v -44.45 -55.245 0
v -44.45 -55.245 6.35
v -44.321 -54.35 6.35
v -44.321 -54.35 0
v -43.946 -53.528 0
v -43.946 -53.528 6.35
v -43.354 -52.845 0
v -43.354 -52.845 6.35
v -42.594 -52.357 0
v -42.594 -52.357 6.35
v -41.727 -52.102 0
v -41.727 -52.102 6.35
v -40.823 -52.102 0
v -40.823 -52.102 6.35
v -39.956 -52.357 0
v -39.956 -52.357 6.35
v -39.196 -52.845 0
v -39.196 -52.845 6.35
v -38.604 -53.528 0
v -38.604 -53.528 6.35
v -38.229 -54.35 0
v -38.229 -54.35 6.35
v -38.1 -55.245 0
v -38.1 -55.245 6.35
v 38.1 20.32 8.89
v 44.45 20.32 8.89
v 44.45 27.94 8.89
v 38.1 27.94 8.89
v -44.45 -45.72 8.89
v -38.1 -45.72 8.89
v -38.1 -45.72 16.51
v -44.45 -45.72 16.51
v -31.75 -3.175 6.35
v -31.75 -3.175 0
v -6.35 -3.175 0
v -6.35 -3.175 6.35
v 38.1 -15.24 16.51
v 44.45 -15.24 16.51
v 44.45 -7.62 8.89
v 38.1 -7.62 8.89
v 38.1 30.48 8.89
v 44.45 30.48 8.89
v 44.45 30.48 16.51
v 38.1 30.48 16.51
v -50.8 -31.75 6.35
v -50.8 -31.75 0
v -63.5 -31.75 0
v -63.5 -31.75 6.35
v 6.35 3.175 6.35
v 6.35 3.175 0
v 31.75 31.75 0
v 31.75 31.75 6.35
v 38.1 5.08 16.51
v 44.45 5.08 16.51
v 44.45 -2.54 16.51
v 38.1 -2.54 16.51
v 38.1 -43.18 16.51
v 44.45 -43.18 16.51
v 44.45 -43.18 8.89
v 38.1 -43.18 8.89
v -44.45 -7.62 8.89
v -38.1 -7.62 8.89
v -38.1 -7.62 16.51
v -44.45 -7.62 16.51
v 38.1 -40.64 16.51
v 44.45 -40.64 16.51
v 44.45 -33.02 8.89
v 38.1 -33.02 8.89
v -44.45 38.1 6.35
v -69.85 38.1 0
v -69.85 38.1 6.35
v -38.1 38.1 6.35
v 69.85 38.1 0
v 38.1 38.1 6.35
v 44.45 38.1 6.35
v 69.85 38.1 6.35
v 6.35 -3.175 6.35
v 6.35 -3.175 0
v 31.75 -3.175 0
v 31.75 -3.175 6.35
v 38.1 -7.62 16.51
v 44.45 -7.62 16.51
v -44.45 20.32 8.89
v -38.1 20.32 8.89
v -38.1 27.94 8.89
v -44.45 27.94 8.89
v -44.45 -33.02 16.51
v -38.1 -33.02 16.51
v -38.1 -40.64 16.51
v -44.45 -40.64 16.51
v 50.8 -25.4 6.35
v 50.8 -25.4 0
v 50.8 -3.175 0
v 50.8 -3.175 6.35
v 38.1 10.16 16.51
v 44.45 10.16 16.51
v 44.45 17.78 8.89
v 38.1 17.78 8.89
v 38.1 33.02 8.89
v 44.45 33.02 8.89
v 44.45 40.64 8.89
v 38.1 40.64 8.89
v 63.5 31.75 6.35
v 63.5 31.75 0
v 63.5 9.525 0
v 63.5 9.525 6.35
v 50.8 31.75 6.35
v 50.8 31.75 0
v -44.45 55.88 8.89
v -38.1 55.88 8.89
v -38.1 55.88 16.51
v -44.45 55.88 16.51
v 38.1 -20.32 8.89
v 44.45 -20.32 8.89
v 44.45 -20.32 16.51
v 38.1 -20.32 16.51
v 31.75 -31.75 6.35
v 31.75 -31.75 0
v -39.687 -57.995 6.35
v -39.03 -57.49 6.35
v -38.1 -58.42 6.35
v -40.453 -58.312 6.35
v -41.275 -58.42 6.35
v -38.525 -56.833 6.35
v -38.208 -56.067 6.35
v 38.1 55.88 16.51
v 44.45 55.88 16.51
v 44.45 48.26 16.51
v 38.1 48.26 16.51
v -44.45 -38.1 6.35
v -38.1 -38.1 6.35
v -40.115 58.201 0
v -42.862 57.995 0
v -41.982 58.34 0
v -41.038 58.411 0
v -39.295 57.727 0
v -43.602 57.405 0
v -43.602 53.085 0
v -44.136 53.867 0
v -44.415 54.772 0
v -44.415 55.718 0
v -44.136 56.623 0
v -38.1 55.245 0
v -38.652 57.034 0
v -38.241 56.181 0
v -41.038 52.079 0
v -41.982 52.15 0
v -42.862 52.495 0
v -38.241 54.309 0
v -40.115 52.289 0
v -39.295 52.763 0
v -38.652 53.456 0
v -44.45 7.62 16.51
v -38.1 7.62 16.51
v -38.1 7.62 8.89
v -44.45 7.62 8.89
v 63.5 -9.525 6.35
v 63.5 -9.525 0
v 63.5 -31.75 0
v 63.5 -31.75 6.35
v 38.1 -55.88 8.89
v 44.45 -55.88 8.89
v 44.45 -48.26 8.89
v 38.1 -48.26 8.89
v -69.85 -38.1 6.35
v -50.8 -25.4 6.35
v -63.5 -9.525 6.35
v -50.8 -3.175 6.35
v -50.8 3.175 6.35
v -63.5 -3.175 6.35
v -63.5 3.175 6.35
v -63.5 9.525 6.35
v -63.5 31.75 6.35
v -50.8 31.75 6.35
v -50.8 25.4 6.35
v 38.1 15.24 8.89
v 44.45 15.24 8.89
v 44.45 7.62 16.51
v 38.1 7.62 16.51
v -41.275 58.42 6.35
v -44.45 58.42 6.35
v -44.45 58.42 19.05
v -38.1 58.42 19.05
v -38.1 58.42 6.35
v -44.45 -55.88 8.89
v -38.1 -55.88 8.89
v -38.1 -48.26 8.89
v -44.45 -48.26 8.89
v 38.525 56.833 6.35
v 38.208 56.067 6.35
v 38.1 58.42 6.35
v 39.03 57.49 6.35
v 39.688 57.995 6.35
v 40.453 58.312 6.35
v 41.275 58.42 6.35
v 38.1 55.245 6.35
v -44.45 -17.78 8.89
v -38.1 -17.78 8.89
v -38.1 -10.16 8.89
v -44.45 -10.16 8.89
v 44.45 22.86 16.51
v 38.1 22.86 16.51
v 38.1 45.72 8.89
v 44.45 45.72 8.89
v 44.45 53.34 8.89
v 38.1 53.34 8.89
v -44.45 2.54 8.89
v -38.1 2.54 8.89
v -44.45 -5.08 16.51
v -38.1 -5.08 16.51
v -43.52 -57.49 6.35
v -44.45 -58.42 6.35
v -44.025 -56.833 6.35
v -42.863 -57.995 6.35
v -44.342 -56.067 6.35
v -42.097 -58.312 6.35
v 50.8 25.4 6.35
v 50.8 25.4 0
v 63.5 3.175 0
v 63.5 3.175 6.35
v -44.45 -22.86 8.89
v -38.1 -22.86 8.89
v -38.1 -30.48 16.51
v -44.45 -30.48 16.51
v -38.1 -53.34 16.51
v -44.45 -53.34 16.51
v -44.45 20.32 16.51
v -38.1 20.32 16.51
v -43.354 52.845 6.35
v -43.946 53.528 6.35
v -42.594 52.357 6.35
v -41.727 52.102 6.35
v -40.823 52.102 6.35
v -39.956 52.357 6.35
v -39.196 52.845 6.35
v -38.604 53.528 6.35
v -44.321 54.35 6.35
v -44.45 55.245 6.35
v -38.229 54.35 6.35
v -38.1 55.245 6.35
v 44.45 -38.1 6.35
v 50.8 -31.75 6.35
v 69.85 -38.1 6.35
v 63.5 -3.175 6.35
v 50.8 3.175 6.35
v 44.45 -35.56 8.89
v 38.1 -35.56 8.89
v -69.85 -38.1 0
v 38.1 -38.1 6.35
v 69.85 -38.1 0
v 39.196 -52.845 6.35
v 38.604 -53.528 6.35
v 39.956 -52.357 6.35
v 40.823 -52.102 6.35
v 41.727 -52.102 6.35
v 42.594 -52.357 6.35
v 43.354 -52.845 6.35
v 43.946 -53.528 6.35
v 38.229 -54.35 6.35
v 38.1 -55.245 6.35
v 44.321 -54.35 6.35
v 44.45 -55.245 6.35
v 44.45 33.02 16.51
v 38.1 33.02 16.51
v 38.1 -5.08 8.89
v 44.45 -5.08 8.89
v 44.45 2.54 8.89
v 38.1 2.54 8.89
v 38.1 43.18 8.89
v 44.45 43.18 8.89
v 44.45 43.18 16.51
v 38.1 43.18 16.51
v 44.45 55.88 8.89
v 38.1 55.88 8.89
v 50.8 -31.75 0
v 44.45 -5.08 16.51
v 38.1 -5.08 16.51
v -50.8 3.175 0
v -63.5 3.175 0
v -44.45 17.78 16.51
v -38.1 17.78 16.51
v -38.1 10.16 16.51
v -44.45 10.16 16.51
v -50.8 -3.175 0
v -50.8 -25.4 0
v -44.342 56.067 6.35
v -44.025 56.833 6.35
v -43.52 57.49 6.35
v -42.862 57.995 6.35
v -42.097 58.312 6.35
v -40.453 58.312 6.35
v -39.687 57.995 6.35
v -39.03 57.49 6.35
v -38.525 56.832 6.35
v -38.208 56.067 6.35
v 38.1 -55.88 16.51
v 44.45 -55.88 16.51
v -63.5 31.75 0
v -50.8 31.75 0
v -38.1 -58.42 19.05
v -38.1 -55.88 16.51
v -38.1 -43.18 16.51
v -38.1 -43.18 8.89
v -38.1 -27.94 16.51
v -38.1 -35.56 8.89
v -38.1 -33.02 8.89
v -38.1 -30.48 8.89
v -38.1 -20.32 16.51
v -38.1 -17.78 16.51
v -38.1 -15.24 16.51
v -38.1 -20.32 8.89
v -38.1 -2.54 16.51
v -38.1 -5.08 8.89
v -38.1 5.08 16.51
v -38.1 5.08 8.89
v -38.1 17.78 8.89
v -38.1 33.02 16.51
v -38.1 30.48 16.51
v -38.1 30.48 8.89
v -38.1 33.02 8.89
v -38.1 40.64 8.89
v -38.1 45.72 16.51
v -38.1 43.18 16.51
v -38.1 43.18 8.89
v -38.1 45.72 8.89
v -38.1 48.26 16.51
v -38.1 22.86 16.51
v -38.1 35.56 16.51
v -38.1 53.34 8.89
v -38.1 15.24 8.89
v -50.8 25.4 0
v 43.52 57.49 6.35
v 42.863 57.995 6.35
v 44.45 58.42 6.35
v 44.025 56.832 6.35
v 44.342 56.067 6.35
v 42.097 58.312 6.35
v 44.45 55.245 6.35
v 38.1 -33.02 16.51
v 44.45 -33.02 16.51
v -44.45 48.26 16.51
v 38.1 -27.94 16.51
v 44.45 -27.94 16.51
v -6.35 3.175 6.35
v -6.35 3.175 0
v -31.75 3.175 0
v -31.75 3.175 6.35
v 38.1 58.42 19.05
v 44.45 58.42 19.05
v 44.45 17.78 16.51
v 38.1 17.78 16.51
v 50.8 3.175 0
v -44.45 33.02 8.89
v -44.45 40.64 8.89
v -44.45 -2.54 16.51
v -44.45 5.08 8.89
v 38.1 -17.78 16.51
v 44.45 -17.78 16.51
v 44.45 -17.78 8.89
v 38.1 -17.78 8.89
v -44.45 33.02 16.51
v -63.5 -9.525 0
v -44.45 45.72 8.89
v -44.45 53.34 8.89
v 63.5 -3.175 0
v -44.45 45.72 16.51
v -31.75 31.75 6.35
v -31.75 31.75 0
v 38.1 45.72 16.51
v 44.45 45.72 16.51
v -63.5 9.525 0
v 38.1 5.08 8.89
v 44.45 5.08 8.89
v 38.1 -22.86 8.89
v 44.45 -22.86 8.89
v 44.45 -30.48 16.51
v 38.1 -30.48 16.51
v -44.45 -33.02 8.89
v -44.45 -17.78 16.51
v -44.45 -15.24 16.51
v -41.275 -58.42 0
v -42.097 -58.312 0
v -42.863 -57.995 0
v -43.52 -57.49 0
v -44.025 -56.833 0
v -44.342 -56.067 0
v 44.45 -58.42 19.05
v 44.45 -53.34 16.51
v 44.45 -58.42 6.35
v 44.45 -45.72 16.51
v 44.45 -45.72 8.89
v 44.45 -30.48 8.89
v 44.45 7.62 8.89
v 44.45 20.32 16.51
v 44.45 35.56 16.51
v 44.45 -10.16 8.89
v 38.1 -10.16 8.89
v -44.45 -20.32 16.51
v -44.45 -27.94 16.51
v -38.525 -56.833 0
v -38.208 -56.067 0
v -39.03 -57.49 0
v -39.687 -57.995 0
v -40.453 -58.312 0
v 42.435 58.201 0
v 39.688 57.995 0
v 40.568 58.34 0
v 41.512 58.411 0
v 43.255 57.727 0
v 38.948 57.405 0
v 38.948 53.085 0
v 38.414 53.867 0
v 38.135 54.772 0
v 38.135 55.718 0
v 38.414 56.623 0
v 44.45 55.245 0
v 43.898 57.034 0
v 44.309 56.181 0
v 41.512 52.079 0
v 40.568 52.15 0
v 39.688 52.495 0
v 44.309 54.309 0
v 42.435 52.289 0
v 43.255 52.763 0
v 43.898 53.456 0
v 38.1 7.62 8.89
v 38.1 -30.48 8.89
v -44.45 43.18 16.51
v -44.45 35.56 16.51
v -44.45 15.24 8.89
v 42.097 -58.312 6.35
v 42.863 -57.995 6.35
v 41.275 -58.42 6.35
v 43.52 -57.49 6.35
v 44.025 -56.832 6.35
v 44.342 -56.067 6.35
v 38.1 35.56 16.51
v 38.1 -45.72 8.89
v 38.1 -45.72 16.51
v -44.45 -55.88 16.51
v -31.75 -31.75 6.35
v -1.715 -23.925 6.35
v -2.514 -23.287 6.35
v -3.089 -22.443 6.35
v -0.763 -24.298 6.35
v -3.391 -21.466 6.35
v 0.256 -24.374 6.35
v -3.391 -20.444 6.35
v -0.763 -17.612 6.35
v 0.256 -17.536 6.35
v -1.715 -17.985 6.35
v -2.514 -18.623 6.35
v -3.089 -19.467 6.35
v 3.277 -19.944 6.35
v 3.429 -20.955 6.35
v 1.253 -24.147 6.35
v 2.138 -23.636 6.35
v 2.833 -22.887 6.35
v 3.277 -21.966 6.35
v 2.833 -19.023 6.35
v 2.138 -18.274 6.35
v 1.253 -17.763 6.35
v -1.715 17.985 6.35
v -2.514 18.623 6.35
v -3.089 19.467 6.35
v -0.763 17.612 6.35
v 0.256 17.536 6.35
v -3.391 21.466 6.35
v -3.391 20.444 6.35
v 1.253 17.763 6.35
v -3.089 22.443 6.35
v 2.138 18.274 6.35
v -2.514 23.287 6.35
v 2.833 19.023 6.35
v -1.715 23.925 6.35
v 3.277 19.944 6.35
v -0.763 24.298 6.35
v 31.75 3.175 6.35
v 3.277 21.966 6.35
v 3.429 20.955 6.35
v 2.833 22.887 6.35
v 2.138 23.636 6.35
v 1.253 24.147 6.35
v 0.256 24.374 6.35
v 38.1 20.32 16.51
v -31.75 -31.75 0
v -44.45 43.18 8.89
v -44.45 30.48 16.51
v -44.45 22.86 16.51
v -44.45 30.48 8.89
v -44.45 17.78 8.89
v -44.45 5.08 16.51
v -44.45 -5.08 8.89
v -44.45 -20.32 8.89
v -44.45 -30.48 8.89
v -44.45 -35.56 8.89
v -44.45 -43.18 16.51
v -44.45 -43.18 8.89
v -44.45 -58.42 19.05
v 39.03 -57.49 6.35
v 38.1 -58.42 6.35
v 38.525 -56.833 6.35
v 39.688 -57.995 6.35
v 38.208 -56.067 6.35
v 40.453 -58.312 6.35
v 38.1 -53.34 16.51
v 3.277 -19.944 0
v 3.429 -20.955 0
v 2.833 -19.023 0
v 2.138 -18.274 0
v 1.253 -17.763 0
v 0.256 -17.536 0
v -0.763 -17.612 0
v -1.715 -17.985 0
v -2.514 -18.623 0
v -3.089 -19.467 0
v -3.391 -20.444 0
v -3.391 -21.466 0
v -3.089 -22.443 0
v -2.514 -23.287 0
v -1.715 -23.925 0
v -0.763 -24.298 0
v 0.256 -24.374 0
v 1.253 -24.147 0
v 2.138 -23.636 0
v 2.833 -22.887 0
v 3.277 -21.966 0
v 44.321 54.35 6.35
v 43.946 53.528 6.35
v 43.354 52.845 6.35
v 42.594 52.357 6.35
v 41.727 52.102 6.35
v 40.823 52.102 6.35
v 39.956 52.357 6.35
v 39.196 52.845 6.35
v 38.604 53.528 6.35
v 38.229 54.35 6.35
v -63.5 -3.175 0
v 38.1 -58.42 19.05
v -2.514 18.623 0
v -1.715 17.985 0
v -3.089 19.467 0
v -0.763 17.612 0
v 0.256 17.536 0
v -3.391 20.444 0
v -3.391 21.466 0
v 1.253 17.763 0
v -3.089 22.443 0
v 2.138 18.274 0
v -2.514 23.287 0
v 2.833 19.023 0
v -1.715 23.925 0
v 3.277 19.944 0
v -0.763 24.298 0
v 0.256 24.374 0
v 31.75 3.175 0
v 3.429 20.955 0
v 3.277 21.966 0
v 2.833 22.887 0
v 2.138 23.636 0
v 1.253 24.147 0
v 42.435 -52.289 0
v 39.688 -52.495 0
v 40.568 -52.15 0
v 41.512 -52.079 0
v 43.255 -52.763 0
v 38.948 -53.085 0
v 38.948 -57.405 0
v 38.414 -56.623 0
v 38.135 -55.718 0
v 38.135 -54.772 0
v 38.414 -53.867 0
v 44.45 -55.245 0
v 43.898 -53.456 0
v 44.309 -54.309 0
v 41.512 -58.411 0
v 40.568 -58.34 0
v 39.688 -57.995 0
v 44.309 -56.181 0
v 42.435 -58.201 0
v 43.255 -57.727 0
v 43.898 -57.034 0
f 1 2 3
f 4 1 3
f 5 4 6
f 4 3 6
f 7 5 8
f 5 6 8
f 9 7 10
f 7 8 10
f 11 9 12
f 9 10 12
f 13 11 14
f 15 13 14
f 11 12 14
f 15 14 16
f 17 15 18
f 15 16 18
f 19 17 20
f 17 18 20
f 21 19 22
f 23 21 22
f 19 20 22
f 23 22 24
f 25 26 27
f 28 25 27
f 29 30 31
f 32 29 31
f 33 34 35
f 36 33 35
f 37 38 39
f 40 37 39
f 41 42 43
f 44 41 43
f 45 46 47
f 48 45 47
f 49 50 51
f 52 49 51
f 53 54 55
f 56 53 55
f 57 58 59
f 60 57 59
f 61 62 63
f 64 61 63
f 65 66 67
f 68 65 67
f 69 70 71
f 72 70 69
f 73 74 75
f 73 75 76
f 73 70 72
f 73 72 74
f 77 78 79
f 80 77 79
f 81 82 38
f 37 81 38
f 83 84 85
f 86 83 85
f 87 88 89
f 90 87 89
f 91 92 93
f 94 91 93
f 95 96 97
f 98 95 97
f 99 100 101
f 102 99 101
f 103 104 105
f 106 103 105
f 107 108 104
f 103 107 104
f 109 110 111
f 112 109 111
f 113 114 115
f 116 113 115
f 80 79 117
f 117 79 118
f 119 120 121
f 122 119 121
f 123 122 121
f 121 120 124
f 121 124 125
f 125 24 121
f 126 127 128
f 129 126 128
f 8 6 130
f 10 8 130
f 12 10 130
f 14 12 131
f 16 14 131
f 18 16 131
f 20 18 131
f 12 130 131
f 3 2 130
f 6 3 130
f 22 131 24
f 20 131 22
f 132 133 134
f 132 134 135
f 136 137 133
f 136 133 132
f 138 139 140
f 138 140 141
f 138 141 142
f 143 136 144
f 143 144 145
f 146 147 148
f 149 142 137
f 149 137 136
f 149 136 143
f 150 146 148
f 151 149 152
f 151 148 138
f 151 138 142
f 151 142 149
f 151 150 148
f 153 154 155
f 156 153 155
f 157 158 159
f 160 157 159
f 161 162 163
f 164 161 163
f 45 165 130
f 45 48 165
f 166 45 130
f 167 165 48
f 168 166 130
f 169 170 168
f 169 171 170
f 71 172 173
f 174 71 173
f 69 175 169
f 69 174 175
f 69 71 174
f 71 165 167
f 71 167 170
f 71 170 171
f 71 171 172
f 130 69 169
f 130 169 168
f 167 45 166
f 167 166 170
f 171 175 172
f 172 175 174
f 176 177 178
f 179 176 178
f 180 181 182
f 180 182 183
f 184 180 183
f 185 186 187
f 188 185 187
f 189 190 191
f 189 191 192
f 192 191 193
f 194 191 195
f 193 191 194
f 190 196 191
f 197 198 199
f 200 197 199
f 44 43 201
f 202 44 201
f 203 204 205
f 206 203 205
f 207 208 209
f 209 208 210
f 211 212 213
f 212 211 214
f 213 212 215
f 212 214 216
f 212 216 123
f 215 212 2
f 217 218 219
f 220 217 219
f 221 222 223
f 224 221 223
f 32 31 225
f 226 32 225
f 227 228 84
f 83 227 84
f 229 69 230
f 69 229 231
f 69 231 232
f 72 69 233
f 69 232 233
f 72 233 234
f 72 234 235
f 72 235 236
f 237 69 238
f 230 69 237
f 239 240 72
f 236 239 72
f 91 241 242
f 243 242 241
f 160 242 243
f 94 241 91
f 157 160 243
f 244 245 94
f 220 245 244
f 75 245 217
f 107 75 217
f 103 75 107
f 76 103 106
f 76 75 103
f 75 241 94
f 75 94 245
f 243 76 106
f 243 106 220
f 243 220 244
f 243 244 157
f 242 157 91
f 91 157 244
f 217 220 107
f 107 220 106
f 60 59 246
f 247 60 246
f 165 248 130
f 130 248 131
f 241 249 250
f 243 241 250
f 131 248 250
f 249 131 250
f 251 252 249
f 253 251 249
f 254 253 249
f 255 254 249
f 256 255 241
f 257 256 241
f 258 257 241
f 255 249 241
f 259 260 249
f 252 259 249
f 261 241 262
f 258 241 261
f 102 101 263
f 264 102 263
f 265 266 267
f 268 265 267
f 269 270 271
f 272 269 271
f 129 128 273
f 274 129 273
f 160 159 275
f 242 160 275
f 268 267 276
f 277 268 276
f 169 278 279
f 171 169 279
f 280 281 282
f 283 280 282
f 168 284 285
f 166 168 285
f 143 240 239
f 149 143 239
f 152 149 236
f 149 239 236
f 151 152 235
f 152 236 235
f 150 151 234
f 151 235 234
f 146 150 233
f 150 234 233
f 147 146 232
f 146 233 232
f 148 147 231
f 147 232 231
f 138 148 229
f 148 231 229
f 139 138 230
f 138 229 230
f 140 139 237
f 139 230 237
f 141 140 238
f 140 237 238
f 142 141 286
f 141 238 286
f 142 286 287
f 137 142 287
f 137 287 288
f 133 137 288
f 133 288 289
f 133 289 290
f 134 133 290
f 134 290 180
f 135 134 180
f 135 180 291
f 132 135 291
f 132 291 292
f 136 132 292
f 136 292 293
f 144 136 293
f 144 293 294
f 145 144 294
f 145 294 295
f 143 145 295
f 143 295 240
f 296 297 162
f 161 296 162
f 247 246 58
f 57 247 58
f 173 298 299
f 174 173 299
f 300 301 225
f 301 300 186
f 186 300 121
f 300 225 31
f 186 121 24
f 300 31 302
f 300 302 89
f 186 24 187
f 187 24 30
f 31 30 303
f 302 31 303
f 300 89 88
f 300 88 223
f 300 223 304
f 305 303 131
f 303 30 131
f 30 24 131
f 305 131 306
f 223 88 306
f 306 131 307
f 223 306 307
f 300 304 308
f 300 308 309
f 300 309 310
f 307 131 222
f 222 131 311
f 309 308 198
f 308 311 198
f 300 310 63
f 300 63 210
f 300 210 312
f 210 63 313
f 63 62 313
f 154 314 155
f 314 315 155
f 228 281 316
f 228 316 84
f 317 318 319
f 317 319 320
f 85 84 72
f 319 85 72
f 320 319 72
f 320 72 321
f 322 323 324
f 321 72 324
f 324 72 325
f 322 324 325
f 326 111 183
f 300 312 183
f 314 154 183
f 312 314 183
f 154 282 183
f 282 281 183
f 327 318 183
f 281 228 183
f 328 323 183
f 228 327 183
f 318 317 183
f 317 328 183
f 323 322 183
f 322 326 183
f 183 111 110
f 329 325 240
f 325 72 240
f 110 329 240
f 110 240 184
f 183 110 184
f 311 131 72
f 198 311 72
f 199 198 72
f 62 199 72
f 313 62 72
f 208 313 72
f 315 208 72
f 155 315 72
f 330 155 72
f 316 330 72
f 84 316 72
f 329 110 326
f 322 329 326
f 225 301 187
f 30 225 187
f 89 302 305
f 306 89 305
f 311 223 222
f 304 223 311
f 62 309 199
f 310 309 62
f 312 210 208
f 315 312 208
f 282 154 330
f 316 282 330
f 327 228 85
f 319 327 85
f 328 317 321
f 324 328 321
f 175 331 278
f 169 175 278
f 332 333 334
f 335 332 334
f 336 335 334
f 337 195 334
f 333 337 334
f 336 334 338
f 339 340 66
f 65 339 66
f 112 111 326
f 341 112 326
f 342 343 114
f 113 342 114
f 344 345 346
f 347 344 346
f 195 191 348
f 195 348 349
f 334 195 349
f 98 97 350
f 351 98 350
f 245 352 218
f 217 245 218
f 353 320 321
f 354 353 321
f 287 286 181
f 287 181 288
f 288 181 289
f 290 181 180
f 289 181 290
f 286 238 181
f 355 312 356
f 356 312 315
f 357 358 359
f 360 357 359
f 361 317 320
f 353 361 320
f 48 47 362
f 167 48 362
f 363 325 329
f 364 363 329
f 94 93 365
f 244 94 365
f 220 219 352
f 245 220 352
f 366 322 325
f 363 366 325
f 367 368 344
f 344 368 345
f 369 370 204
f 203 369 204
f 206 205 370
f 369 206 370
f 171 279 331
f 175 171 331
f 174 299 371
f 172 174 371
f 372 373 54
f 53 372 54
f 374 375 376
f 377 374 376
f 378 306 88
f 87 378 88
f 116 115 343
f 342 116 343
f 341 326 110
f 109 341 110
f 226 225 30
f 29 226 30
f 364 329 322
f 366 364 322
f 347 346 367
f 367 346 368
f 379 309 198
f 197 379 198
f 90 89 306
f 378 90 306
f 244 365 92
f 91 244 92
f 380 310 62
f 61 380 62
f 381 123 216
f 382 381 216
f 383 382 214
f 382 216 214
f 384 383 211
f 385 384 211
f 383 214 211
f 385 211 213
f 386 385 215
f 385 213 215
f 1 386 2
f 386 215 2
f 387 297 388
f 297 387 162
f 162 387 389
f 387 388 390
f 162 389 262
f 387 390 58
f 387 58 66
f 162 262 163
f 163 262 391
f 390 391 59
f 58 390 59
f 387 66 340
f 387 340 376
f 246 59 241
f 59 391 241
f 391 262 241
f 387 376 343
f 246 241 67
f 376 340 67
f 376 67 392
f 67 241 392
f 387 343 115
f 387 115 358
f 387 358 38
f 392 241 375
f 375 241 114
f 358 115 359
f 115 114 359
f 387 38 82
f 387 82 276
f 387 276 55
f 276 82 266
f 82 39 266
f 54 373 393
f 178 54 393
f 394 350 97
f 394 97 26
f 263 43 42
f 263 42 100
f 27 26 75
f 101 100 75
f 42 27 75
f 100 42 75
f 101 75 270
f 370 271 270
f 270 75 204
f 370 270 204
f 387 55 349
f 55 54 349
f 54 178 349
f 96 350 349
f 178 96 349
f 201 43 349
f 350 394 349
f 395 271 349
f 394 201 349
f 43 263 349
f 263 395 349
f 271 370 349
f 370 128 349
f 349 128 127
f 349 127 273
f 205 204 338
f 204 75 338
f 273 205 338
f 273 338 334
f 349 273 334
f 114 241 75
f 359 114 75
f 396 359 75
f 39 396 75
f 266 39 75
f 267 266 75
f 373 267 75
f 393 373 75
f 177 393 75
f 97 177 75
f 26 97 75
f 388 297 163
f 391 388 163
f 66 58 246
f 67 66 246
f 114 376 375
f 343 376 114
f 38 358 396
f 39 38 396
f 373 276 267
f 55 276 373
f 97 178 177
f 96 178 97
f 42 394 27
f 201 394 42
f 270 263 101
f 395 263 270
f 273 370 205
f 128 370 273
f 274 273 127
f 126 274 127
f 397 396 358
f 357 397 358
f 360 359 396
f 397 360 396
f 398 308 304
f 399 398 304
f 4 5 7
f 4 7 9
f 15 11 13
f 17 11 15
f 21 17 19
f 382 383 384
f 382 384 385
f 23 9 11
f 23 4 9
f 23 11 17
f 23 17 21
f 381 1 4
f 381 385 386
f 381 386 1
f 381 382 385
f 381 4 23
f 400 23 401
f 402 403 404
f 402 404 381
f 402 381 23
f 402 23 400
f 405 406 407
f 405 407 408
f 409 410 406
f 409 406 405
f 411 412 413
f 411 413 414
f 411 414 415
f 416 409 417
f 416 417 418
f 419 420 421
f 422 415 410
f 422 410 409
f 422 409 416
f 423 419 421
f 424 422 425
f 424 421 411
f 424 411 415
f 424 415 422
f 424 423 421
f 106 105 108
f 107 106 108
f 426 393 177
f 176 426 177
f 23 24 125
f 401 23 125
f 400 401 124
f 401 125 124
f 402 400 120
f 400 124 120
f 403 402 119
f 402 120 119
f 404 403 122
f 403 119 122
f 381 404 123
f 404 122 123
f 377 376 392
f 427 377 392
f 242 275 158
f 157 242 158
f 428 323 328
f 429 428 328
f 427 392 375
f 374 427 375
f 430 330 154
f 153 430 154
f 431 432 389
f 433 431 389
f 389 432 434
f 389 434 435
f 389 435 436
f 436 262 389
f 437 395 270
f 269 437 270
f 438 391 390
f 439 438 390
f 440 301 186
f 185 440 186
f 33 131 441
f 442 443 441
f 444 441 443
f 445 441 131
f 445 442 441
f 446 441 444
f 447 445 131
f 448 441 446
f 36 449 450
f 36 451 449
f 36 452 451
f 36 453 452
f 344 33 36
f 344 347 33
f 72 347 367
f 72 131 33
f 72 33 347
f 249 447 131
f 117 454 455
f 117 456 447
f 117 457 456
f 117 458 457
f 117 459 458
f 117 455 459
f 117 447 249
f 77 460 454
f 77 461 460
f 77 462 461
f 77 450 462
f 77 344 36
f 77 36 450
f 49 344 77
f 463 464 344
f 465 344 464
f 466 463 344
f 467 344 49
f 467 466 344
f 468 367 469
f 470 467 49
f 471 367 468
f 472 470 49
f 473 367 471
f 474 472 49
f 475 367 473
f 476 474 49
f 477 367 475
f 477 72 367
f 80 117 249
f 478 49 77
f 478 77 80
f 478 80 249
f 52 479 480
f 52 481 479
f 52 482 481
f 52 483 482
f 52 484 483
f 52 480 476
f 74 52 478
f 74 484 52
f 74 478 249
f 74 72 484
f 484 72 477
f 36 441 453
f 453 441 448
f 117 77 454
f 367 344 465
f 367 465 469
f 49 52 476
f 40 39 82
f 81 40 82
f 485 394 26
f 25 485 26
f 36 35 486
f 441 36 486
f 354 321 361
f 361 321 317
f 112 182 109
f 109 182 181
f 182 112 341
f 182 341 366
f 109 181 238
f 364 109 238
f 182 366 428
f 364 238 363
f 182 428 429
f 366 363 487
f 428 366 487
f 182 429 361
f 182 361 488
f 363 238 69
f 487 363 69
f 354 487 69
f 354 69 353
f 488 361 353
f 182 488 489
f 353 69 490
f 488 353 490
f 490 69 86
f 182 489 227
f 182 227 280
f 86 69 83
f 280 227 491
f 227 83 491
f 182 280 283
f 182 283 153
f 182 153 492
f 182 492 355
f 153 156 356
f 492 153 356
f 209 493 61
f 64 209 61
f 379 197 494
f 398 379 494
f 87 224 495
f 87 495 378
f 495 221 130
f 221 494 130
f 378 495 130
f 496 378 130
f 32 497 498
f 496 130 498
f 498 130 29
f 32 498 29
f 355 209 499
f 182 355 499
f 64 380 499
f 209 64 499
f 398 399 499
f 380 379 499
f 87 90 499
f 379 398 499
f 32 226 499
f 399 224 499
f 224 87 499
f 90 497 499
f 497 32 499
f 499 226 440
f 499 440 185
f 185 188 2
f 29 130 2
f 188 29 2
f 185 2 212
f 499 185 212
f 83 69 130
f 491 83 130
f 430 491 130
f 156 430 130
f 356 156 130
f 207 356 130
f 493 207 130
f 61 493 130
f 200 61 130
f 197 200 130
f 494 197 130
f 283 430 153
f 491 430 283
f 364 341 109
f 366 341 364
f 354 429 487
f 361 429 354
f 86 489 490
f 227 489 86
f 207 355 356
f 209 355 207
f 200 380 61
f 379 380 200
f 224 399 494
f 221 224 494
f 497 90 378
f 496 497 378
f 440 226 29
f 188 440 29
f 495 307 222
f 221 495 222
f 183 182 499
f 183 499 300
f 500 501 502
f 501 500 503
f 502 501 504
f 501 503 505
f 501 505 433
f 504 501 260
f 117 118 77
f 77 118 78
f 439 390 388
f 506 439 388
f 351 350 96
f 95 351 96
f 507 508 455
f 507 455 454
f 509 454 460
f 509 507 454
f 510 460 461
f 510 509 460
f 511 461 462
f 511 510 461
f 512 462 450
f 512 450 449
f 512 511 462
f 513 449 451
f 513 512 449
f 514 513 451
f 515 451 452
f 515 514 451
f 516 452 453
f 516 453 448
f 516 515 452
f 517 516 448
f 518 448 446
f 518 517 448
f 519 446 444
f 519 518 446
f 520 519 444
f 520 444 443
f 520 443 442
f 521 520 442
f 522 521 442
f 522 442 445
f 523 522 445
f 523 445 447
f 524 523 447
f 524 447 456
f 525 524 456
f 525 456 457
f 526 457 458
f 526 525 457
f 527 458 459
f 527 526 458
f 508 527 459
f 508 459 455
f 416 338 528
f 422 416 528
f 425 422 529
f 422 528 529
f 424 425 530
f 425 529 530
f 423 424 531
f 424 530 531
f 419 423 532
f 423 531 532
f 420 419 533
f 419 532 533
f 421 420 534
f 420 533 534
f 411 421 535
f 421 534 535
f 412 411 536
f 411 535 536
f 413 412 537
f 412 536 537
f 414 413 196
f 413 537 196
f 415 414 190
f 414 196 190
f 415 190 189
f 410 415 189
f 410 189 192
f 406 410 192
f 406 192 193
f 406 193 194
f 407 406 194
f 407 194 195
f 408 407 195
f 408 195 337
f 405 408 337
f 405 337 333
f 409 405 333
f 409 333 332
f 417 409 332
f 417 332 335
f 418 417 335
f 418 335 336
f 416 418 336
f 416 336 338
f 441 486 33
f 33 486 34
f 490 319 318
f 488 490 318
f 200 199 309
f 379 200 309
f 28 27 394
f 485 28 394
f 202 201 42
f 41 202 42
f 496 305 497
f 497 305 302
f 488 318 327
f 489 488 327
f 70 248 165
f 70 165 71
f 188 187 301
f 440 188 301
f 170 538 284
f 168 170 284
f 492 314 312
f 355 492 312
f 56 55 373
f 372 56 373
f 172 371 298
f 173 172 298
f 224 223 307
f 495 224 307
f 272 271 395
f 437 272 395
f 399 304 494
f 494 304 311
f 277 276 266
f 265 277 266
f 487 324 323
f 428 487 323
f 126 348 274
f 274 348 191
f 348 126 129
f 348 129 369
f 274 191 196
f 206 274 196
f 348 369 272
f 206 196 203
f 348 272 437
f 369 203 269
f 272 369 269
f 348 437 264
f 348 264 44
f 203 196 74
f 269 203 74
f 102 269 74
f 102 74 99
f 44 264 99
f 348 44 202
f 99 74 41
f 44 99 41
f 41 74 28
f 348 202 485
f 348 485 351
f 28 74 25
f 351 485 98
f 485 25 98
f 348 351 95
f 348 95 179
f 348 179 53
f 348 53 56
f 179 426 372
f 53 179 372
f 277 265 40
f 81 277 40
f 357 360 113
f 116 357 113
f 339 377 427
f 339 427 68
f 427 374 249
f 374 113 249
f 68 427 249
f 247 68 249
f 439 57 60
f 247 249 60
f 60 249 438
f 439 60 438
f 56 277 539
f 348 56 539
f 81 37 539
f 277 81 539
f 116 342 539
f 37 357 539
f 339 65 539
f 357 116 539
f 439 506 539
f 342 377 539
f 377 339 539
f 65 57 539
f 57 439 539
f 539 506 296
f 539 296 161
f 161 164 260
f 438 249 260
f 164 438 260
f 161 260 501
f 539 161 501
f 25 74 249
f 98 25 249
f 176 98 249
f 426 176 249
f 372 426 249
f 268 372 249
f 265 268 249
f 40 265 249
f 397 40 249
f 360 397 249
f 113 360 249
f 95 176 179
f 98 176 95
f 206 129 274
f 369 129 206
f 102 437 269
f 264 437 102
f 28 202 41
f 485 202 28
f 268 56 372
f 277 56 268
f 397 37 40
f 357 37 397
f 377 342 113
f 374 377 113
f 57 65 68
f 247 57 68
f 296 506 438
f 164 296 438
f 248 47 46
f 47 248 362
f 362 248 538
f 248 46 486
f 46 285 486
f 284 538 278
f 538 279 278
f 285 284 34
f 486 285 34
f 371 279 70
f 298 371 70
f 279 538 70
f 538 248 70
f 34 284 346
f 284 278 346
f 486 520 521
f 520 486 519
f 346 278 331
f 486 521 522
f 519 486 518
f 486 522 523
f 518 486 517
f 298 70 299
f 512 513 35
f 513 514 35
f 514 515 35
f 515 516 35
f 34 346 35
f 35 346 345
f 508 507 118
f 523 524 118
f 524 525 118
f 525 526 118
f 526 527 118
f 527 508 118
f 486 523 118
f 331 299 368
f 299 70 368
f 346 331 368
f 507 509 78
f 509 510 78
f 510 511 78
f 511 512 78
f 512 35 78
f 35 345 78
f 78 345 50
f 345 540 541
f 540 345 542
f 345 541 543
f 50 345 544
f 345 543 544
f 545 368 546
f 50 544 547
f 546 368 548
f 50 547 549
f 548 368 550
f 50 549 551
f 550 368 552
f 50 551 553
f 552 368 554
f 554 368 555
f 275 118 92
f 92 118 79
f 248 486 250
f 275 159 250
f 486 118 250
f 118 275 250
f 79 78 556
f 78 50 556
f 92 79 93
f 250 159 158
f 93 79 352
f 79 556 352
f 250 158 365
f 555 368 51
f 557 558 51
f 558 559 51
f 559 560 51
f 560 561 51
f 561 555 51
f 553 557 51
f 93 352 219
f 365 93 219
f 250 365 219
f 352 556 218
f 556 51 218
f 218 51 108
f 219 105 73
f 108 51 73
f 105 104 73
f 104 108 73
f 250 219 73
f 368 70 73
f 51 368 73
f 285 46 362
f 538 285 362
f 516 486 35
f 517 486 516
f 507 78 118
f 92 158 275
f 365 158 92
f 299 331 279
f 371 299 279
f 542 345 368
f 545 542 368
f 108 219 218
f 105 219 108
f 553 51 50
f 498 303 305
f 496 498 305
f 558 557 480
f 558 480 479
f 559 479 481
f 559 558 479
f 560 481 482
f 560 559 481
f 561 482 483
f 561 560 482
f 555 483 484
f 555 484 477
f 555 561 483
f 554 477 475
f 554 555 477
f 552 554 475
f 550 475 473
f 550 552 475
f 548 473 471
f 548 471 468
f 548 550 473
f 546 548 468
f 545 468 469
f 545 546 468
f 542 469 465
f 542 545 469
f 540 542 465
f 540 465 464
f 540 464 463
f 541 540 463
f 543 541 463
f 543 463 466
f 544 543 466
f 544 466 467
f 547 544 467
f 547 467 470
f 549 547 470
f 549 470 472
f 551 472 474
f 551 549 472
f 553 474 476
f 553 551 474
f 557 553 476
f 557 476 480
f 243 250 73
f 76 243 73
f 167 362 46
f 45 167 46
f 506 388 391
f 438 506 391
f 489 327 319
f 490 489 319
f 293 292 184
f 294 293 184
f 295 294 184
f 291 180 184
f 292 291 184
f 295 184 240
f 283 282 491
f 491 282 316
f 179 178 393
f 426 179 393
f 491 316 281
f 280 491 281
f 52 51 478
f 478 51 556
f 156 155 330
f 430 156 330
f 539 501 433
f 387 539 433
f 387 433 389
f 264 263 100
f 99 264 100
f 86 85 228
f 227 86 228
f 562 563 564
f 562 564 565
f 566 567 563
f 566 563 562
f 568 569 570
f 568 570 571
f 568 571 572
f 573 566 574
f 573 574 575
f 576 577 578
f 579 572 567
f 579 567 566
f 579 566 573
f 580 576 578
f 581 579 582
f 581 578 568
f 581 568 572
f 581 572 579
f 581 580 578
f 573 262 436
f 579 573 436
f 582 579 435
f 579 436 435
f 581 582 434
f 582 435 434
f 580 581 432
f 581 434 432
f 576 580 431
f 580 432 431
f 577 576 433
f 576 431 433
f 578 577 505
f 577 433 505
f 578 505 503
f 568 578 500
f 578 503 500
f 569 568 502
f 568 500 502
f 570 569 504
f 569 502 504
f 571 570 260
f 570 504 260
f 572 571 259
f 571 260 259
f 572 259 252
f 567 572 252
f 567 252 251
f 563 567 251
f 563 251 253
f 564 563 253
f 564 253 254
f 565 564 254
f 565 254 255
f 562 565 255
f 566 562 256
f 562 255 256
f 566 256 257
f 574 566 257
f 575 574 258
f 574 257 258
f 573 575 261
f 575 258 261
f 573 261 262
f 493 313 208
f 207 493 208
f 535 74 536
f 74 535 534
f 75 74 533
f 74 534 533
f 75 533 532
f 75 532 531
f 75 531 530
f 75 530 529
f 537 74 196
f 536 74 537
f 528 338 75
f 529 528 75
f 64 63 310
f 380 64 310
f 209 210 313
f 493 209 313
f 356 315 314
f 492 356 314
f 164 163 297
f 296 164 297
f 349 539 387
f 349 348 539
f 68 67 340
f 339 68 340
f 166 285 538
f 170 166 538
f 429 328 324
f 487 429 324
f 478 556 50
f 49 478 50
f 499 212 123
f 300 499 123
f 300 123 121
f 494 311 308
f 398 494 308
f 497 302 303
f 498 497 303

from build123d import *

# Parameters (mm, degrees)
F0_W     = 139.7
F0_H     = 76.2
F0_R     = 3.429
F1_DEPTH = 6.35
F2_W     = 6.35
F2_H     = 20.32
F2_H_2   = 76.2
F3_DEPTH = 12.7
F5_DEPTH = 114.301
F6_R     = 3.175
F7_DEPTH = 6.35


# Not quite as in the source:
# - a feature names something its author has since deleted; it is built from what else it names


with BuildPart() as f1:
    # F0 (on Top) → F1 (new body)
    with BuildSketch(Plane.XY):
        Rectangle(F0_W, F0_H)
        Polygon((-63.5, -9.525), (-50.8, -31.75), (-63.5, -31.75), align=None, mode=Mode.SUBTRACT)
        Polygon((-50.8, -25.4), (-63.5, -3.175), (-50.8, -3.175), align=None, mode=Mode.SUBTRACT)
        Polygon((-31.75, -31.75), (-31.75, -3.175), (-6.35, -3.175), align=None, mode=Mode.SUBTRACT)
        with Locations((0, -20.955)):
            Circle(F0_R, mode=Mode.SUBTRACT)
        Polygon((50.8, -31.75), (63.5, -9.525), (63.5, -31.75), align=None, mode=Mode.SUBTRACT)
        Polygon((31.75, -31.75), (6.35, -3.175), (31.75, -3.175), align=None, mode=Mode.SUBTRACT)
        Polygon((63.5, -3.175), (50.8, -25.4), (50.8, -3.175), align=None, mode=Mode.SUBTRACT)
        Polygon((-50.8, 25.4), (-50.8, 3.175), (-63.5, 3.175), align=None, mode=Mode.SUBTRACT)
        Polygon((-6.35, 3.175), (-31.75, 3.175), (-31.75, 31.75), align=None, mode=Mode.SUBTRACT)
        Polygon((-50.8, 31.75), (-63.5, 9.525), (-63.5, 31.75), align=None, mode=Mode.SUBTRACT)
        Polygon((6.35, 3.175), (31.75, 31.75), (31.75, 3.175), align=None, mode=Mode.SUBTRACT)
        Polygon((63.5, 3.175), (50.8, 3.175), (50.8, 25.4), align=None, mode=Mode.SUBTRACT)
        with Locations((0, 20.955)):
            Circle(F0_R, mode=Mode.SUBTRACT)
        Polygon((63.5, 9.525), (50.8, 31.75), (63.5, 31.75), align=None, mode=Mode.SUBTRACT)
    extrude(amount=F1_DEPTH)

    # F2 (on face) → F3 (join)
    with BuildSketch(Plane.XY.offset(6.35)):
        with Locations((41.275, -48.26)):
            Rectangle(F2_W, F2_H)
        with Locations((41.275, 0)):
            Rectangle(F2_W, F2_H_2)
        with Locations((41.275, 48.26)):
            Rectangle(F2_W, F2_H)
        with Locations((-41.275, 48.26)):
            Rectangle(F2_W, F2_H)
        with Locations((-41.275, 0)):
            Rectangle(F2_W, F2_H_2)
        with Locations((-41.275, -48.26)):
            Rectangle(F2_W, F2_H)
    extrude(amount=F3_DEPTH)

    # F4 (on face) → F5 (cut, through all)
    with BuildSketch(Plane.YZ.offset(44.45)):
        Polygon((-48.26, 8.89), (-55.88, 16.51), (-55.88, 8.89), align=None)
        Polygon((-45.72, 16.51), (-53.34, 16.51), (-45.72, 8.89), align=None)
        Polygon((-40.64, 16.51), (-33.02, 8.89), (-33.02, 16.51), align=None)
        Polygon((-43.18, 8.89), (-35.56, 8.89), (-43.18, 16.51), align=None)
        Polygon((-27.94, 16.51), (-20.32, 8.89), (-20.32, 16.51), align=None)
        Polygon((-30.48, 8.89), (-22.86, 8.89), (-30.48, 16.51), align=None)
        Polygon((-15.24, 16.51), (-7.62, 8.89), (-7.62, 16.51), align=None)
        Polygon((-17.78, 8.89), (-10.16, 8.89), (-17.78, 16.51), align=None)
        Polygon((-2.54, 16.51), (5.08, 8.89), (5.08, 16.51), align=None)
        Polygon((-5.08, 8.89), (2.54, 8.89), (-5.08, 16.51), align=None)
        Polygon((10.16, 16.51), (17.78, 8.89), (17.78, 16.51), align=None)
        Polygon((7.62, 8.89), (15.24, 8.89), (7.62, 16.51), align=None)
        Polygon((22.86, 16.51), (30.48, 8.89), (30.48, 16.51), align=None)
        Polygon((20.32, 8.89), (27.94, 8.89), (20.32, 16.51), align=None)
        Polygon((35.56, 16.51), (43.18, 8.89), (43.18, 16.51), align=None)
        Polygon((33.02, 8.89), (40.64, 8.89), (33.02, 16.51), align=None)
        Polygon((48.26, 16.51), (55.88, 8.89), (55.88, 16.51), align=None)
        Polygon((45.72, 8.89), (53.34, 8.89), (45.72, 16.51), align=None)
    extrude(amount=-F5_DEPTH, mode=Mode.SUBTRACT)

    # F6 (on face) → F7 (join)
    with BuildSketch(Plane(origin=(0, 0, 6.35), x_dir=(1, 0, 0), z_dir=(0, 0, -1))):
        with BuildLine():
            ThreePointArc((-44.45, 55.245), (-41.275, 52.07), (-38.1, 55.245))
            ThreePointArc((-38.1, 55.245), (-39.0299359697, 57.4900640303), (-41.275, 58.42))
            ThreePointArc((-41.275, 58.42), (-43.5200640303, 57.4900640303), (-44.45, 55.245))
        make_face()
        with Locations((41.275, 55.245)):
            Circle(F6_R)
        with Locations((-41.275, -55.245)):
            Circle(F6_R)
        with Locations((41.275, -55.245)):
            Circle(F6_R)
    extrude(amount=F7_DEPTH)


solid = f1.part
